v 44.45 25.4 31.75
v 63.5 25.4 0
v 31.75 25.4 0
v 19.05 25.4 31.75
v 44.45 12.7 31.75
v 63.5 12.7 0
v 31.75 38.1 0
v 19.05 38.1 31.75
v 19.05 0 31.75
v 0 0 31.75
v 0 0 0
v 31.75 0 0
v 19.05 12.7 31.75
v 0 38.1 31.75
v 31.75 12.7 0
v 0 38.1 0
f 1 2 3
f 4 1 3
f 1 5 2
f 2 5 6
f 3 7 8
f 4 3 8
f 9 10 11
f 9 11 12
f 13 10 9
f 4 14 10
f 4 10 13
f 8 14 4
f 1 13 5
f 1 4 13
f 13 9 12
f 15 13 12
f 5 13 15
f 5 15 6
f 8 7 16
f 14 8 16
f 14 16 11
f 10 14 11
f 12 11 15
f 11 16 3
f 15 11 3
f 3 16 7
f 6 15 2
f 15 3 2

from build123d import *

# Parameters (mm, degrees)
F1_DEPTH = 31.75
F3_DEPTH = 12.7
F5_DEPTH = 25.401
F7_DEPTH = 12.7


with BuildPart() as f1:
    # F0 (on Top) → F1 (new body)
    with BuildSketch(Plane.XY):
        Polygon((0, 38.1), (0, 0), (31.75, 0), (31.75, 12.7), (63.5, 12.7), (63.5, 25.4), (31.75, 25.4), (31.75, 38.1), align=None)
    extrude(amount=F1_DEPTH)

    # F2 (on face) → F3 (cut)
    with BuildSketch(Plane.XZ):
        Polygon((31.75, 31.75), (19.05, 31.75), (31.75, 0), align=None)
    extrude(amount=-F3_DEPTH, mode=Mode.SUBTRACT)

    # F4 (on face) → F5 (cut, through all)
    with BuildSketch(Plane.XZ.offset(-12.7)):
        Polygon((63.5, 31.75), (44.45, 31.75), (63.5, 0), align=None)
    extrude(amount=-F5_DEPTH, mode=Mode.SUBTRACT)

    # F6 (on face) → F7 (cut)
    with BuildSketch(Plane(origin=(0, 38.1, 0), x_dir=(-1, 0, 0), z_dir=(0, 1, 0))):
        Polygon((-31.75, 0), (-19.05, 31.75), (-31.75, 31.75), align=None)
    extrude(amount=-F7_DEPTH, mode=Mode.SUBTRACT)


solid = f1.part
